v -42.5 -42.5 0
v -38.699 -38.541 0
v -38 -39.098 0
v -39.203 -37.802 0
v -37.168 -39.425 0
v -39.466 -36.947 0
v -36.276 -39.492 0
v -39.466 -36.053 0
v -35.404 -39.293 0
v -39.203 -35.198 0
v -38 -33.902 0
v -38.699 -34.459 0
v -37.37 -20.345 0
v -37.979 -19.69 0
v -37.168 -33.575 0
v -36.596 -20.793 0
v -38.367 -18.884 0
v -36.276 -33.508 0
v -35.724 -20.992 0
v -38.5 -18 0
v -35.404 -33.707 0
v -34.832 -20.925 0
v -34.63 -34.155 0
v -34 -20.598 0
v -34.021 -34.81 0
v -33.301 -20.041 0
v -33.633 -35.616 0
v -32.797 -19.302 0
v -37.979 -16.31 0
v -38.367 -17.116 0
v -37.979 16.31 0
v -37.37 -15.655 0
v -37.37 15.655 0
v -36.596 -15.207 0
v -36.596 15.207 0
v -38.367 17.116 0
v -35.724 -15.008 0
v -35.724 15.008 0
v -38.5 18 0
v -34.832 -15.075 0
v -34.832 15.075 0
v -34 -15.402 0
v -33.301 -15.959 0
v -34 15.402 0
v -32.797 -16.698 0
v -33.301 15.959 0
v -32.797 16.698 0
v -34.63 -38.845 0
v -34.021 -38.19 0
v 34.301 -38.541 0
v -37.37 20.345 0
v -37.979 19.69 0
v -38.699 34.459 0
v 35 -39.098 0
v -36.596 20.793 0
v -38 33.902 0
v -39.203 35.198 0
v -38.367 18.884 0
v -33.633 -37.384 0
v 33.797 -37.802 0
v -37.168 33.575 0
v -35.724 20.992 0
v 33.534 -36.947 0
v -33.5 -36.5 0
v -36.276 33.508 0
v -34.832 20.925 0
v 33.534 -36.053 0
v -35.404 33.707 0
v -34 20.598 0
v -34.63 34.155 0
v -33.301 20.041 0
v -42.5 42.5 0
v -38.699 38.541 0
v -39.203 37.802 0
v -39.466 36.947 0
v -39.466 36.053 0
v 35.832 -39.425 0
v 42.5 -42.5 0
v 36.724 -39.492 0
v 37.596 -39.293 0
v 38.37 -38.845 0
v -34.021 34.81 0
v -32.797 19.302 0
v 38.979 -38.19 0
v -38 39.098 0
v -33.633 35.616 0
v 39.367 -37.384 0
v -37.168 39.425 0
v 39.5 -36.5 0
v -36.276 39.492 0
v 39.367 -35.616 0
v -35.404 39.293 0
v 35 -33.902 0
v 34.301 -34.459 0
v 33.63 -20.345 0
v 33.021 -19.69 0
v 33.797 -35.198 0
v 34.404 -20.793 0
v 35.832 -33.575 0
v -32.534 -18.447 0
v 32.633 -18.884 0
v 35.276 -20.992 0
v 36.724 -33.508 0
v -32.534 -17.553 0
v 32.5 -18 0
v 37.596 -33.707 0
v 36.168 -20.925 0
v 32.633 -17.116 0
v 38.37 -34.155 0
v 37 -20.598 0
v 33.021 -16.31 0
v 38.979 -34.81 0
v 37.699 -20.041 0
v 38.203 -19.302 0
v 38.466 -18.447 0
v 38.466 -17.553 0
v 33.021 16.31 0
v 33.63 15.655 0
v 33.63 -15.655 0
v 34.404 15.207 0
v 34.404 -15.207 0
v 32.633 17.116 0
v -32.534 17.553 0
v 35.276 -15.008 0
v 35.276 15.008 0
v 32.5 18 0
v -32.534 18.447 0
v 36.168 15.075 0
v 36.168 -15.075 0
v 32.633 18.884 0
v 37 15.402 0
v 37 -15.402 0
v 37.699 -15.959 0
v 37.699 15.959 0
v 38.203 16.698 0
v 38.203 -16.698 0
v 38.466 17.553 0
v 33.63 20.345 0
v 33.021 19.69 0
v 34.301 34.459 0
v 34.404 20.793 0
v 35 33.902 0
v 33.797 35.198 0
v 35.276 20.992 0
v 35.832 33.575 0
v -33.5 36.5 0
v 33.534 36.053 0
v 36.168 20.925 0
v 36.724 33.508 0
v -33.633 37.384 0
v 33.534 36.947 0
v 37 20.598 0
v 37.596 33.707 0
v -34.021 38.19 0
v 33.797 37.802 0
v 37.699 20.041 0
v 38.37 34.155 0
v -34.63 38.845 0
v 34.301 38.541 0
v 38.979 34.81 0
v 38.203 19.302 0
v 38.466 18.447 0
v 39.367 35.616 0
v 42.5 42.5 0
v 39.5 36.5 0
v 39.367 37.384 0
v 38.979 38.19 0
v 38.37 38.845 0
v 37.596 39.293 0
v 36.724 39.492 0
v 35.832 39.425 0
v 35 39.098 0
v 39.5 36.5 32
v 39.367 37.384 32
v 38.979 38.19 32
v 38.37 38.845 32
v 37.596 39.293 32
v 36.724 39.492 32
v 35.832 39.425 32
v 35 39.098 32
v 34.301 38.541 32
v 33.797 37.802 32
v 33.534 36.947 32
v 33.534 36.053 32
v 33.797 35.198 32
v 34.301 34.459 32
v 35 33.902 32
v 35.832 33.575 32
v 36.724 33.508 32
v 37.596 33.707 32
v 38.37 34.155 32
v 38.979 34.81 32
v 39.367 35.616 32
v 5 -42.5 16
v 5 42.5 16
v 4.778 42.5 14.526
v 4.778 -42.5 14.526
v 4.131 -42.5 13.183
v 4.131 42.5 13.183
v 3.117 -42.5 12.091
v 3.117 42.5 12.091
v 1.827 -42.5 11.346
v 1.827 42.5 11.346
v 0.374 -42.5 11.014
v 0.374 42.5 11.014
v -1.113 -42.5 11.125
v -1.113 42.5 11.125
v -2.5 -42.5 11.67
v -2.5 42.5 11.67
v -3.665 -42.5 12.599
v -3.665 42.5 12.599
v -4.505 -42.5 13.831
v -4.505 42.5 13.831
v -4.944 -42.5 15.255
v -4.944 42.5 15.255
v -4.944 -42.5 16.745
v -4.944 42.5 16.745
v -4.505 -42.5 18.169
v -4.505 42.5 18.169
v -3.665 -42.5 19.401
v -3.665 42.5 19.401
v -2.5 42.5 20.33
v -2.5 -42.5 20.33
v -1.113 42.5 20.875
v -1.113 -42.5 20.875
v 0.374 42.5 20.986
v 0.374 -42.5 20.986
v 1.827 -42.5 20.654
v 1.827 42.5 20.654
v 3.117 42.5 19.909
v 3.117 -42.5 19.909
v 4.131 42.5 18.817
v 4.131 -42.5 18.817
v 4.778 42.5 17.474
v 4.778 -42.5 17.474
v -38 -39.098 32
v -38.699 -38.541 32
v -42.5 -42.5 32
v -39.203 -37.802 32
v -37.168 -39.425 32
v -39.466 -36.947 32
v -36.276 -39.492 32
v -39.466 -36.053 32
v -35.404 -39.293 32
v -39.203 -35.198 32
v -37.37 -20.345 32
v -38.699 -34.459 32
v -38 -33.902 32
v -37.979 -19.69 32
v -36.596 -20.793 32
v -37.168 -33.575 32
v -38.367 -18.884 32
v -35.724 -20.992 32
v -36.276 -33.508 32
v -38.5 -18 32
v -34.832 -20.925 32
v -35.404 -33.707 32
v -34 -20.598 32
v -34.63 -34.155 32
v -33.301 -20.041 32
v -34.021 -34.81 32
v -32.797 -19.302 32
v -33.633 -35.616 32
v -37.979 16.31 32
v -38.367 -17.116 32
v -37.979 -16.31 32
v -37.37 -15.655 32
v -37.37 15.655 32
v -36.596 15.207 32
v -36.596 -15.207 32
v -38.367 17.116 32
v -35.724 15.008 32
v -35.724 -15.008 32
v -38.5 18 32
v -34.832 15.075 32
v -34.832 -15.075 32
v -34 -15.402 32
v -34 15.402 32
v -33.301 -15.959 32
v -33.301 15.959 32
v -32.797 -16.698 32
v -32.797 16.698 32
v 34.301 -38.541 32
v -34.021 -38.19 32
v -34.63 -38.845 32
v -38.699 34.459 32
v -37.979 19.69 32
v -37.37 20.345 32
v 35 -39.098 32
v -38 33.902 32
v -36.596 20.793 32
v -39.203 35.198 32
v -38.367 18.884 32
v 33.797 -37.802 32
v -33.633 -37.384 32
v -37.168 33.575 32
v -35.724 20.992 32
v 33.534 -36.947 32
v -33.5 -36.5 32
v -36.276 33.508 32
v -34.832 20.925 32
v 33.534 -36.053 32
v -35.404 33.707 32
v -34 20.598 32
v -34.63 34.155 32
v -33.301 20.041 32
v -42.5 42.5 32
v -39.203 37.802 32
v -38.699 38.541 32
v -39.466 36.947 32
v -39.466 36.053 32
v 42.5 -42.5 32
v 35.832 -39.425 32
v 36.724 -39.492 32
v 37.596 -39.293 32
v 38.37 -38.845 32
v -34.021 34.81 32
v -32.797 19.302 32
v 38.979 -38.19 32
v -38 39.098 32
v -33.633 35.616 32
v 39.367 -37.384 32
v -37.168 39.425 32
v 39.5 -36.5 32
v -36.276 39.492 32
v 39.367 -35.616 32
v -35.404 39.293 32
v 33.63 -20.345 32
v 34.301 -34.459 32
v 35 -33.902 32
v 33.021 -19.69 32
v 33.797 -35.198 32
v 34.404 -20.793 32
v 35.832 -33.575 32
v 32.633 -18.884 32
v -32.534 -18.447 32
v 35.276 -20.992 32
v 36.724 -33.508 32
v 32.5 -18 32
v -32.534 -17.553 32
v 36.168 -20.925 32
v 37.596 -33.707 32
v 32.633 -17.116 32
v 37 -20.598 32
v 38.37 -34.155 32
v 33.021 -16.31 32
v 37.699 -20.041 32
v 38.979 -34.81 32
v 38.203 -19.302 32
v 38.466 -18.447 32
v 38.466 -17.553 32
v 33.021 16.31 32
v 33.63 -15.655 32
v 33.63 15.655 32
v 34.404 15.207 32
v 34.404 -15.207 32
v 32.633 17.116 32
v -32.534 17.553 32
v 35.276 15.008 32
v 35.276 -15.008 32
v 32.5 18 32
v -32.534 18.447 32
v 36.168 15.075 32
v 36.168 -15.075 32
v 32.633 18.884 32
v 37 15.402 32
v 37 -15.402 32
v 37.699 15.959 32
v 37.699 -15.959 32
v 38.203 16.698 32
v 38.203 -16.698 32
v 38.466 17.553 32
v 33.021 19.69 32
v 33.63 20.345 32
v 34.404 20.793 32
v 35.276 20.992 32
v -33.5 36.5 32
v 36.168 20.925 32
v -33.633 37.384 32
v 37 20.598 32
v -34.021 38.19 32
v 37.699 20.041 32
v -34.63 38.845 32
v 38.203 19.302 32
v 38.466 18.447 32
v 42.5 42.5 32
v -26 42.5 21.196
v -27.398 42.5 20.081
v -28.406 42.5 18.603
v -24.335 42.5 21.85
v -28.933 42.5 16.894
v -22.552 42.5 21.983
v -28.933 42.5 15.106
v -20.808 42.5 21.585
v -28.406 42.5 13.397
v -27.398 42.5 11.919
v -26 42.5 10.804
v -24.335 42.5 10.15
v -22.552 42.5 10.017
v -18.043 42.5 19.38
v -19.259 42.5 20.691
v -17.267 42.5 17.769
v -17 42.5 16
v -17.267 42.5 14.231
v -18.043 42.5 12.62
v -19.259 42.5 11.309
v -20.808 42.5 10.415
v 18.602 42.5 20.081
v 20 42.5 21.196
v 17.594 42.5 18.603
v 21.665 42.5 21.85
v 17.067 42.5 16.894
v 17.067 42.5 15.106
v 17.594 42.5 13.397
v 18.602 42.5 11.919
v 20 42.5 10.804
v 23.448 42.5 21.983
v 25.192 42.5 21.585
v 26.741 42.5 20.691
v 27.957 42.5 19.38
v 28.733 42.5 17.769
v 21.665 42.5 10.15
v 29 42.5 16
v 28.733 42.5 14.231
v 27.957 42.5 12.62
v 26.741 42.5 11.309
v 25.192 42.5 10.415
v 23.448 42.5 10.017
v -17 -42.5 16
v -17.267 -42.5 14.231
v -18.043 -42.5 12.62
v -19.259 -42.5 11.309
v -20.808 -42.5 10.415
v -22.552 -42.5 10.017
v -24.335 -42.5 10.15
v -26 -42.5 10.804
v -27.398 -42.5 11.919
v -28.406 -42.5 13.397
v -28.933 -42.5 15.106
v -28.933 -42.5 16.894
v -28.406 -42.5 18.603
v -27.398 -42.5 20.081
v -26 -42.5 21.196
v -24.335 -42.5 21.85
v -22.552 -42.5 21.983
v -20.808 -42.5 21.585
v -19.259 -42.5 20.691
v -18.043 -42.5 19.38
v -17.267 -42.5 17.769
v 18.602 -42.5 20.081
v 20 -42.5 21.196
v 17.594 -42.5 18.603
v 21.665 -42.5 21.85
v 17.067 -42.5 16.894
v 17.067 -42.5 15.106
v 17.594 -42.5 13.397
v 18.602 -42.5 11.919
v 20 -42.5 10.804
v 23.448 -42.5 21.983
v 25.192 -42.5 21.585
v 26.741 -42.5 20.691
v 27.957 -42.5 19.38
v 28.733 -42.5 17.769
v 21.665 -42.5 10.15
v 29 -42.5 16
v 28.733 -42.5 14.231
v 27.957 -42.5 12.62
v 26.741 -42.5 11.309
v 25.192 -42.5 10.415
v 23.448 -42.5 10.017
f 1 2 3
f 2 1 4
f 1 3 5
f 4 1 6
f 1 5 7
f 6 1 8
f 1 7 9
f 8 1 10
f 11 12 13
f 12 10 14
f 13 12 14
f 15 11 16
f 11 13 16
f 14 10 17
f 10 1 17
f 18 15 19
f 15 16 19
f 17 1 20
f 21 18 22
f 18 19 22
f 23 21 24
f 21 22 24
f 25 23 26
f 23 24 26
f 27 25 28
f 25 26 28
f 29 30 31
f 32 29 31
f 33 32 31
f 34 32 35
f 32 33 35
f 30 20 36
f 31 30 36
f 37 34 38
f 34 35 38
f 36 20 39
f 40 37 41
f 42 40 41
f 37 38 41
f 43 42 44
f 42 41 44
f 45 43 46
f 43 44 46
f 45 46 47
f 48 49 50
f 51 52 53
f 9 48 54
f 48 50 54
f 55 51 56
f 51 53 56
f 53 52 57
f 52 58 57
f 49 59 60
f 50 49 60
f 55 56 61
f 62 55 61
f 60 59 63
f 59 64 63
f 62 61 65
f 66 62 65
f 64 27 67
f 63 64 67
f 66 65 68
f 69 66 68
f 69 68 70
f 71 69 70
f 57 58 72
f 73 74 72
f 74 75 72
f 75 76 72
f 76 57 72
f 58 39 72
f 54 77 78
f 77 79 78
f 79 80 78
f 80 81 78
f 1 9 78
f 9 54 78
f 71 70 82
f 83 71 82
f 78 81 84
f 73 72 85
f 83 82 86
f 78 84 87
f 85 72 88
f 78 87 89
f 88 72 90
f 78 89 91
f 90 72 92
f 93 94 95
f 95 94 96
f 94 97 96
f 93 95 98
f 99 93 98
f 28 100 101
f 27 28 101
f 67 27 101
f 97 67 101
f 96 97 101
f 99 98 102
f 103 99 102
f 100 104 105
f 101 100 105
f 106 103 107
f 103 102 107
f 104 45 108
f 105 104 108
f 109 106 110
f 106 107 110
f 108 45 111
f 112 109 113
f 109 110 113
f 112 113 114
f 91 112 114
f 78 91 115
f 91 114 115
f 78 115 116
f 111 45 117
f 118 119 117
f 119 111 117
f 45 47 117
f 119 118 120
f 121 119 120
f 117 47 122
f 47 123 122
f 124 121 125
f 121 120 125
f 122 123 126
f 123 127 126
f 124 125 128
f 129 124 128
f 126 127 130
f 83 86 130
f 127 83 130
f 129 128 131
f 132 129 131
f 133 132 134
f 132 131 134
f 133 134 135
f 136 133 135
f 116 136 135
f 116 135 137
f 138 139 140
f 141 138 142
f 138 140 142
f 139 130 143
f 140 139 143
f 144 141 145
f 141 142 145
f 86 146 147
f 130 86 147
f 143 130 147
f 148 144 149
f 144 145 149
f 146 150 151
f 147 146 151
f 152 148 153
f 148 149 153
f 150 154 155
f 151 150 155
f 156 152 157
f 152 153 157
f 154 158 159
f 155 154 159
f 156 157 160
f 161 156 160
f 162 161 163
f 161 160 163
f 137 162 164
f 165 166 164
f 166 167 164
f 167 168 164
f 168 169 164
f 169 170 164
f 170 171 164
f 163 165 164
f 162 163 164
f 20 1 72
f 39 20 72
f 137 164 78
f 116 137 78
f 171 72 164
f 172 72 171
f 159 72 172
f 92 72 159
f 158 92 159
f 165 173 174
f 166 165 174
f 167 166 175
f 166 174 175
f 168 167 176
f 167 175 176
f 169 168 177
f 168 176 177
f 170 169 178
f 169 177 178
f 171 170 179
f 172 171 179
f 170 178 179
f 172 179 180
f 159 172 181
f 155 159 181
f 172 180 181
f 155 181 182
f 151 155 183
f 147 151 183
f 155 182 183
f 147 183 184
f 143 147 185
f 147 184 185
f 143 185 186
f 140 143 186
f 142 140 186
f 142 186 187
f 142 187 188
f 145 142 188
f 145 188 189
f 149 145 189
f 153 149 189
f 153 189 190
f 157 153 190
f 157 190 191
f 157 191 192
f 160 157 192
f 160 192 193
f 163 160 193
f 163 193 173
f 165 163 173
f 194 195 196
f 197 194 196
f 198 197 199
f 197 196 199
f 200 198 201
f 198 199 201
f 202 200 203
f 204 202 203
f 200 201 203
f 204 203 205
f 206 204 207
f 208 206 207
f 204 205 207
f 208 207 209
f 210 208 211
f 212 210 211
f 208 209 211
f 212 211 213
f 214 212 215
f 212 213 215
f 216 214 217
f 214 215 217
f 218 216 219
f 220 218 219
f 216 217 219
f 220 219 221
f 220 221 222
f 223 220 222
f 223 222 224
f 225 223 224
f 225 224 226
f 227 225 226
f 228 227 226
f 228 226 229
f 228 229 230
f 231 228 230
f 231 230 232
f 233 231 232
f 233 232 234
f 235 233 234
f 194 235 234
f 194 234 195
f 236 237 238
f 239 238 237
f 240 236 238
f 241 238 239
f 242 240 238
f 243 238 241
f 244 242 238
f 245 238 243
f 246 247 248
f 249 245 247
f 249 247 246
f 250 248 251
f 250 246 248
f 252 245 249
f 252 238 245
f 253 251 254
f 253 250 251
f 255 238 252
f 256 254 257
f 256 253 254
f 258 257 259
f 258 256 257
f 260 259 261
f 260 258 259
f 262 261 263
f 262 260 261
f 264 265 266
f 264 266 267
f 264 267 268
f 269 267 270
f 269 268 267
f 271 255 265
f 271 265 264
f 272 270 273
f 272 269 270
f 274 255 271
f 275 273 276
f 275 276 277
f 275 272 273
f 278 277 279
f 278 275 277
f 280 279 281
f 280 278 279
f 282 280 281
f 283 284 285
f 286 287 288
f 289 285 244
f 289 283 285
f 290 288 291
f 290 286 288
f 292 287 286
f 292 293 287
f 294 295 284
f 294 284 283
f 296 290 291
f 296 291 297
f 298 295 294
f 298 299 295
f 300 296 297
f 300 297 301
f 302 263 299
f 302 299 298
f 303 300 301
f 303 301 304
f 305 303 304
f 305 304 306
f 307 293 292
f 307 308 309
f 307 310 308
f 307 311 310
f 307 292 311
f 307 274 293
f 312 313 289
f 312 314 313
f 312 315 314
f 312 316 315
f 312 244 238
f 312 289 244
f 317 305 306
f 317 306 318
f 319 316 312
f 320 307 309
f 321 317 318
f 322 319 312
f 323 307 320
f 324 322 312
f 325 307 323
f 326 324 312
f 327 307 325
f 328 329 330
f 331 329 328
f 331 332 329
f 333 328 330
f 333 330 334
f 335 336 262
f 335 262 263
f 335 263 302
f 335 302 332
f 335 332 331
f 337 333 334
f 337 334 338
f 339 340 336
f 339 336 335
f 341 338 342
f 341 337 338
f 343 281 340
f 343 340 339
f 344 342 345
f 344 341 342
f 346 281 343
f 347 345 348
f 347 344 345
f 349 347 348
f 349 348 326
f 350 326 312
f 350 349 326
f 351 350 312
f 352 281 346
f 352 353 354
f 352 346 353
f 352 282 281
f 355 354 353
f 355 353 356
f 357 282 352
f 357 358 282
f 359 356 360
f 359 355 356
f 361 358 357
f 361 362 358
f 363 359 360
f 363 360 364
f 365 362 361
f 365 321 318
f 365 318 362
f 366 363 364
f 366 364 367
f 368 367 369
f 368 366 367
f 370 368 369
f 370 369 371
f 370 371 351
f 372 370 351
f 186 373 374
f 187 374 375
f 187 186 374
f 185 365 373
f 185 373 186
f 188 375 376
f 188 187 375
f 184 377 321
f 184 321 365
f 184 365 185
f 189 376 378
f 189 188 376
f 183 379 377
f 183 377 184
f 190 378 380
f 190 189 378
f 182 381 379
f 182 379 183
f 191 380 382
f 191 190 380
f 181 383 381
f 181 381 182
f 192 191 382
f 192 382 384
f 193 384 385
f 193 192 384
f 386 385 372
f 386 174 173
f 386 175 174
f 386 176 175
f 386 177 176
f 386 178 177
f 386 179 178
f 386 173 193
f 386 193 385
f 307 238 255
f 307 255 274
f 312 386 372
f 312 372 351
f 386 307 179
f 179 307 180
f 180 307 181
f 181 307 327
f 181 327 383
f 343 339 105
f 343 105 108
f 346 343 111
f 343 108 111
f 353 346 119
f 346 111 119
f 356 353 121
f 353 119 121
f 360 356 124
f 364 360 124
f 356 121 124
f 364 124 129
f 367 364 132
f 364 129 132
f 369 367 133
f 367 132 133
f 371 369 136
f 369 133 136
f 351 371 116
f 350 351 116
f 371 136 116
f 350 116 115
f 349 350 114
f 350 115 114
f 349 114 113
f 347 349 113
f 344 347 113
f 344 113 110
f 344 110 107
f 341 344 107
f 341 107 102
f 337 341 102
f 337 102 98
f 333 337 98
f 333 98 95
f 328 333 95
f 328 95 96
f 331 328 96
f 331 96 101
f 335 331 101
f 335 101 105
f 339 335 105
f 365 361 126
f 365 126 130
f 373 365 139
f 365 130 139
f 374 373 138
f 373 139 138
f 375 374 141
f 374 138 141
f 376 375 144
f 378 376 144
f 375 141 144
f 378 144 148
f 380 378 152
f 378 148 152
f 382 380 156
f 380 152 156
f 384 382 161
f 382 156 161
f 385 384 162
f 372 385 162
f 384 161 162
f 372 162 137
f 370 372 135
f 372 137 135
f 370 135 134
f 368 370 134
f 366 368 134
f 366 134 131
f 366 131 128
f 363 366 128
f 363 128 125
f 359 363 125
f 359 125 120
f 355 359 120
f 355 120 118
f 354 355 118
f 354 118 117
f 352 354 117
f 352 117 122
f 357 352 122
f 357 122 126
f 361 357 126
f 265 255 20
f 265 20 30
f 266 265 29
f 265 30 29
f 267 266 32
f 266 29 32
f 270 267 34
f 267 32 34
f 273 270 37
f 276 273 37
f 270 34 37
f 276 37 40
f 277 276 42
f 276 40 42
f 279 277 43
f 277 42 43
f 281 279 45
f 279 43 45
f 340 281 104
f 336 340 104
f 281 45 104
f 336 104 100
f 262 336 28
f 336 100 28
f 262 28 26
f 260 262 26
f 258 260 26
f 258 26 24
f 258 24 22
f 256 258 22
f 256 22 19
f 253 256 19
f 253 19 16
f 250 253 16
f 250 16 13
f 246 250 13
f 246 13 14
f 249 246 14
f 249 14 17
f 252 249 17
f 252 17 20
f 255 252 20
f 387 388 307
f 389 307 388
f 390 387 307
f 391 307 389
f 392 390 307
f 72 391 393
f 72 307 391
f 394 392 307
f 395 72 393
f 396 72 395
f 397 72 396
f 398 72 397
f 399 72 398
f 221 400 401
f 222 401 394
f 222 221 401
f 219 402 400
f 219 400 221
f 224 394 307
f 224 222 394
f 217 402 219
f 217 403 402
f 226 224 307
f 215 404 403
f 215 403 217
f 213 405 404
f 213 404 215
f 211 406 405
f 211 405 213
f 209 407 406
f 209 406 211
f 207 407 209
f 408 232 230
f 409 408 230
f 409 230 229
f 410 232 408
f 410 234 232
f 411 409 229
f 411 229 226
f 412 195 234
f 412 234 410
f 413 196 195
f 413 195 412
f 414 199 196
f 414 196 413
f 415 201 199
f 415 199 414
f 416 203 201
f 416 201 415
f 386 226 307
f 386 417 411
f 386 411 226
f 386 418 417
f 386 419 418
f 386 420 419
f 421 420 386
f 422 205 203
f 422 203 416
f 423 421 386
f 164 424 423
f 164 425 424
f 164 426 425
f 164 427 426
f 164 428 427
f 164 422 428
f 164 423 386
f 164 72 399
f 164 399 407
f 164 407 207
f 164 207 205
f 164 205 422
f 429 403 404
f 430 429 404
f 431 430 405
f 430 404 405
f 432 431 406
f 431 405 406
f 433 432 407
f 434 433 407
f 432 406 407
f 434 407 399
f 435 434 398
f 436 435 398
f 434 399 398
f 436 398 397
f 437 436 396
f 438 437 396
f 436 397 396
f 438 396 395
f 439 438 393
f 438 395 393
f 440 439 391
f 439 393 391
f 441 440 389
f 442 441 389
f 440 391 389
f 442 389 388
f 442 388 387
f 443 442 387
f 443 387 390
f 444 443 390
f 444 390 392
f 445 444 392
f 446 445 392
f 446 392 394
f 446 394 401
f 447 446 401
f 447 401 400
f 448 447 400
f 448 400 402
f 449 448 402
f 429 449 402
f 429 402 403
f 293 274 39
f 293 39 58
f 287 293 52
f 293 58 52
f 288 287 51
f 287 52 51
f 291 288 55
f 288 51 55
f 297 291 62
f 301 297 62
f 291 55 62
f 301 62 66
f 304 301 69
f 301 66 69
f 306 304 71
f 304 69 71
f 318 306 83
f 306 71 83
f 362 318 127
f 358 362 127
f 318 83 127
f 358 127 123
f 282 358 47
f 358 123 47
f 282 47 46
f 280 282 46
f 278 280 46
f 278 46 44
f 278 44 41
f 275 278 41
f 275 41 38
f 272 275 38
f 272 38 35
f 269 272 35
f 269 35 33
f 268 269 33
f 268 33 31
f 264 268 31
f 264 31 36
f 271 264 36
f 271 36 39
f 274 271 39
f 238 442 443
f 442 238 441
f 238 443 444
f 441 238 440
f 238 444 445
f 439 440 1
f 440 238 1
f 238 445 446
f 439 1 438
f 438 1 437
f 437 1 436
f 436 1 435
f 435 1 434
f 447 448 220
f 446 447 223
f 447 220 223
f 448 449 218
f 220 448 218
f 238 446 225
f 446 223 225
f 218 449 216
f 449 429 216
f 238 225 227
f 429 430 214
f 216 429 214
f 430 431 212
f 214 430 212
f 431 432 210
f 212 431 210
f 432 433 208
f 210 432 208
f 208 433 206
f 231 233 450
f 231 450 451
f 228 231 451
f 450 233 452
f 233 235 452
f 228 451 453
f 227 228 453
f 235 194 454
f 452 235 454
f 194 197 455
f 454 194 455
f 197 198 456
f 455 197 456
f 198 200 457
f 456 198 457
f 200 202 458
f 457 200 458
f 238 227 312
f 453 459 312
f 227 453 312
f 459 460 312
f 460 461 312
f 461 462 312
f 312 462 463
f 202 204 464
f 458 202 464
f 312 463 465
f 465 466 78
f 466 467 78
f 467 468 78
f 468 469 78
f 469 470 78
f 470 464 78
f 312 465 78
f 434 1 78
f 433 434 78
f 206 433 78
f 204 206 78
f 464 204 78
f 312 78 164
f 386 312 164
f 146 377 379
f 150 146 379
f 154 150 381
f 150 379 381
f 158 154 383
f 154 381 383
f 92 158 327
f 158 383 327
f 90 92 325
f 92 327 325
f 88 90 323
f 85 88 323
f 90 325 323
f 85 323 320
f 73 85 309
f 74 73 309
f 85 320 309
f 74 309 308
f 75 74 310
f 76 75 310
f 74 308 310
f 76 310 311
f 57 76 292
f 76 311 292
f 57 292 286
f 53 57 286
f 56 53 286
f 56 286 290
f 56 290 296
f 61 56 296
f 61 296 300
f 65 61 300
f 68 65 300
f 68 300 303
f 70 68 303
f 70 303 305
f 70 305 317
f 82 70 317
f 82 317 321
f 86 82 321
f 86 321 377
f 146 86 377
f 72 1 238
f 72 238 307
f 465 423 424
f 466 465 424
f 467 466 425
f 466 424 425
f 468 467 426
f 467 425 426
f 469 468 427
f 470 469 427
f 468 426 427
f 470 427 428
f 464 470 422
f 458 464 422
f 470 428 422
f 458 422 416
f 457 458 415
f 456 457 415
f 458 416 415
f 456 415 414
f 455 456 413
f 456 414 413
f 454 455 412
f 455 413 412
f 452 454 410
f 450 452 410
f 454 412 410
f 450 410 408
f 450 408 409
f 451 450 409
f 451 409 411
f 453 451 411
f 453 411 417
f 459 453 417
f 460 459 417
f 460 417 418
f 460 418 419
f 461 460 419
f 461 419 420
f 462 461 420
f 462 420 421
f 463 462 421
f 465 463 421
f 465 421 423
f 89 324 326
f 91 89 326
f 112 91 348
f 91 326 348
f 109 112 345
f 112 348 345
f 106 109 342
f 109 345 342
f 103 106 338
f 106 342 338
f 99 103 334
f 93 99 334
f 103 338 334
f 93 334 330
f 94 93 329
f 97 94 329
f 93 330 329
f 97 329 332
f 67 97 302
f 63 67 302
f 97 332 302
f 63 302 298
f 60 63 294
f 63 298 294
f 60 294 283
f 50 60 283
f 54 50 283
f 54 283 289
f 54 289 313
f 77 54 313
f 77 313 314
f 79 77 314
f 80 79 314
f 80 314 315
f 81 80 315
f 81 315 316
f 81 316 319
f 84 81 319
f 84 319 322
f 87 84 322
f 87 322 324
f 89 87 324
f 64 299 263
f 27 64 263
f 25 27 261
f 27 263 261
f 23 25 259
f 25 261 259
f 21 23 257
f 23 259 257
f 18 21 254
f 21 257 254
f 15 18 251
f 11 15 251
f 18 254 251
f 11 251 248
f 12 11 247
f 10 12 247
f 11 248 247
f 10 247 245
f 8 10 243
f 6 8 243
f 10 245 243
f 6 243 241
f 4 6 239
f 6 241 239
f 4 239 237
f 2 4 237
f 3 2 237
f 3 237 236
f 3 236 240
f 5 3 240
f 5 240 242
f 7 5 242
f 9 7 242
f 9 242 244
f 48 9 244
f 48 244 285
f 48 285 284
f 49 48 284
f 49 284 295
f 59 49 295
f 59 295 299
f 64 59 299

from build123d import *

# Parameters (mm, degrees)
SKETCH1_W           = 85
SKETCH1_H           = 85
BOSS_EXTRUDE1_DEPTH = 32
SKETCH2_R           = 3
CUT_EXTRUDE1_DEPTH  = 33
SKETCH3_R           = 5
SKETCH3_R_2         = 6
CUT_EXTRUDE2_DEPTH  = 86
SKETCH4_R           = 3
CUT_EXTRUDE3_DEPTH  = 33


with BuildPart() as part:
    # Sketch1 → Boss-Extrude1 (new body)
    with BuildSketch(Plane.XY):
        Rectangle(SKETCH1_W, SKETCH1_H)
    extrude(amount=BOSS_EXTRUDE1_DEPTH)

    # Sketch2 → Cut-Extrude1 (cut, through all)
    with BuildSketch(Plane.XY.offset(32)):
        with Locations((-36.5, 36.5)):
            Circle(SKETCH2_R)
        with Locations((36.5, 36.5)):
            Circle(SKETCH2_R)
        with Locations((36.5, -36.5)):
            Circle(SKETCH2_R)
        with Locations((-36.5, -36.5)):
            Circle(SKETCH2_R)
    extrude(amount=-CUT_EXTRUDE1_DEPTH, mode=Mode.SUBTRACT)

    # Sketch3 → Cut-Extrude2 (cut, through all)
    with BuildSketch(Plane(origin=(0, 42.5, 0), x_dir=(1, 0, 0), z_dir=(0, 1, 0))):
        with Locations((0, -16)):
            Circle(SKETCH3_R)
        with Locations((-23, -16)):
            Circle(SKETCH3_R_2)
        with Locations((23, -16)):
            Circle(SKETCH3_R_2)
    extrude(amount=-CUT_EXTRUDE2_DEPTH, mode=Mode.SUBTRACT)

    # Sketch4 → Cut-Extrude3 (cut, through all)
    with BuildSketch(Plane(origin=(0, 0, 0), x_dir=(-1, 0, 0), z_dir=(0, 0, -1))):
        with Locations((-35.5, 18)):
            Circle(SKETCH4_R)
        with Locations((-35.5, -18)):
            Circle(SKETCH4_R)
        with Locations((35.5, -18)):
            Circle(SKETCH4_R)
        with Locations((35.5, 18)):
            Circle(SKETCH4_R)
    extrude(amount=-CUT_EXTRUDE3_DEPTH, mode=Mode.SUBTRACT)


solid = part.part
